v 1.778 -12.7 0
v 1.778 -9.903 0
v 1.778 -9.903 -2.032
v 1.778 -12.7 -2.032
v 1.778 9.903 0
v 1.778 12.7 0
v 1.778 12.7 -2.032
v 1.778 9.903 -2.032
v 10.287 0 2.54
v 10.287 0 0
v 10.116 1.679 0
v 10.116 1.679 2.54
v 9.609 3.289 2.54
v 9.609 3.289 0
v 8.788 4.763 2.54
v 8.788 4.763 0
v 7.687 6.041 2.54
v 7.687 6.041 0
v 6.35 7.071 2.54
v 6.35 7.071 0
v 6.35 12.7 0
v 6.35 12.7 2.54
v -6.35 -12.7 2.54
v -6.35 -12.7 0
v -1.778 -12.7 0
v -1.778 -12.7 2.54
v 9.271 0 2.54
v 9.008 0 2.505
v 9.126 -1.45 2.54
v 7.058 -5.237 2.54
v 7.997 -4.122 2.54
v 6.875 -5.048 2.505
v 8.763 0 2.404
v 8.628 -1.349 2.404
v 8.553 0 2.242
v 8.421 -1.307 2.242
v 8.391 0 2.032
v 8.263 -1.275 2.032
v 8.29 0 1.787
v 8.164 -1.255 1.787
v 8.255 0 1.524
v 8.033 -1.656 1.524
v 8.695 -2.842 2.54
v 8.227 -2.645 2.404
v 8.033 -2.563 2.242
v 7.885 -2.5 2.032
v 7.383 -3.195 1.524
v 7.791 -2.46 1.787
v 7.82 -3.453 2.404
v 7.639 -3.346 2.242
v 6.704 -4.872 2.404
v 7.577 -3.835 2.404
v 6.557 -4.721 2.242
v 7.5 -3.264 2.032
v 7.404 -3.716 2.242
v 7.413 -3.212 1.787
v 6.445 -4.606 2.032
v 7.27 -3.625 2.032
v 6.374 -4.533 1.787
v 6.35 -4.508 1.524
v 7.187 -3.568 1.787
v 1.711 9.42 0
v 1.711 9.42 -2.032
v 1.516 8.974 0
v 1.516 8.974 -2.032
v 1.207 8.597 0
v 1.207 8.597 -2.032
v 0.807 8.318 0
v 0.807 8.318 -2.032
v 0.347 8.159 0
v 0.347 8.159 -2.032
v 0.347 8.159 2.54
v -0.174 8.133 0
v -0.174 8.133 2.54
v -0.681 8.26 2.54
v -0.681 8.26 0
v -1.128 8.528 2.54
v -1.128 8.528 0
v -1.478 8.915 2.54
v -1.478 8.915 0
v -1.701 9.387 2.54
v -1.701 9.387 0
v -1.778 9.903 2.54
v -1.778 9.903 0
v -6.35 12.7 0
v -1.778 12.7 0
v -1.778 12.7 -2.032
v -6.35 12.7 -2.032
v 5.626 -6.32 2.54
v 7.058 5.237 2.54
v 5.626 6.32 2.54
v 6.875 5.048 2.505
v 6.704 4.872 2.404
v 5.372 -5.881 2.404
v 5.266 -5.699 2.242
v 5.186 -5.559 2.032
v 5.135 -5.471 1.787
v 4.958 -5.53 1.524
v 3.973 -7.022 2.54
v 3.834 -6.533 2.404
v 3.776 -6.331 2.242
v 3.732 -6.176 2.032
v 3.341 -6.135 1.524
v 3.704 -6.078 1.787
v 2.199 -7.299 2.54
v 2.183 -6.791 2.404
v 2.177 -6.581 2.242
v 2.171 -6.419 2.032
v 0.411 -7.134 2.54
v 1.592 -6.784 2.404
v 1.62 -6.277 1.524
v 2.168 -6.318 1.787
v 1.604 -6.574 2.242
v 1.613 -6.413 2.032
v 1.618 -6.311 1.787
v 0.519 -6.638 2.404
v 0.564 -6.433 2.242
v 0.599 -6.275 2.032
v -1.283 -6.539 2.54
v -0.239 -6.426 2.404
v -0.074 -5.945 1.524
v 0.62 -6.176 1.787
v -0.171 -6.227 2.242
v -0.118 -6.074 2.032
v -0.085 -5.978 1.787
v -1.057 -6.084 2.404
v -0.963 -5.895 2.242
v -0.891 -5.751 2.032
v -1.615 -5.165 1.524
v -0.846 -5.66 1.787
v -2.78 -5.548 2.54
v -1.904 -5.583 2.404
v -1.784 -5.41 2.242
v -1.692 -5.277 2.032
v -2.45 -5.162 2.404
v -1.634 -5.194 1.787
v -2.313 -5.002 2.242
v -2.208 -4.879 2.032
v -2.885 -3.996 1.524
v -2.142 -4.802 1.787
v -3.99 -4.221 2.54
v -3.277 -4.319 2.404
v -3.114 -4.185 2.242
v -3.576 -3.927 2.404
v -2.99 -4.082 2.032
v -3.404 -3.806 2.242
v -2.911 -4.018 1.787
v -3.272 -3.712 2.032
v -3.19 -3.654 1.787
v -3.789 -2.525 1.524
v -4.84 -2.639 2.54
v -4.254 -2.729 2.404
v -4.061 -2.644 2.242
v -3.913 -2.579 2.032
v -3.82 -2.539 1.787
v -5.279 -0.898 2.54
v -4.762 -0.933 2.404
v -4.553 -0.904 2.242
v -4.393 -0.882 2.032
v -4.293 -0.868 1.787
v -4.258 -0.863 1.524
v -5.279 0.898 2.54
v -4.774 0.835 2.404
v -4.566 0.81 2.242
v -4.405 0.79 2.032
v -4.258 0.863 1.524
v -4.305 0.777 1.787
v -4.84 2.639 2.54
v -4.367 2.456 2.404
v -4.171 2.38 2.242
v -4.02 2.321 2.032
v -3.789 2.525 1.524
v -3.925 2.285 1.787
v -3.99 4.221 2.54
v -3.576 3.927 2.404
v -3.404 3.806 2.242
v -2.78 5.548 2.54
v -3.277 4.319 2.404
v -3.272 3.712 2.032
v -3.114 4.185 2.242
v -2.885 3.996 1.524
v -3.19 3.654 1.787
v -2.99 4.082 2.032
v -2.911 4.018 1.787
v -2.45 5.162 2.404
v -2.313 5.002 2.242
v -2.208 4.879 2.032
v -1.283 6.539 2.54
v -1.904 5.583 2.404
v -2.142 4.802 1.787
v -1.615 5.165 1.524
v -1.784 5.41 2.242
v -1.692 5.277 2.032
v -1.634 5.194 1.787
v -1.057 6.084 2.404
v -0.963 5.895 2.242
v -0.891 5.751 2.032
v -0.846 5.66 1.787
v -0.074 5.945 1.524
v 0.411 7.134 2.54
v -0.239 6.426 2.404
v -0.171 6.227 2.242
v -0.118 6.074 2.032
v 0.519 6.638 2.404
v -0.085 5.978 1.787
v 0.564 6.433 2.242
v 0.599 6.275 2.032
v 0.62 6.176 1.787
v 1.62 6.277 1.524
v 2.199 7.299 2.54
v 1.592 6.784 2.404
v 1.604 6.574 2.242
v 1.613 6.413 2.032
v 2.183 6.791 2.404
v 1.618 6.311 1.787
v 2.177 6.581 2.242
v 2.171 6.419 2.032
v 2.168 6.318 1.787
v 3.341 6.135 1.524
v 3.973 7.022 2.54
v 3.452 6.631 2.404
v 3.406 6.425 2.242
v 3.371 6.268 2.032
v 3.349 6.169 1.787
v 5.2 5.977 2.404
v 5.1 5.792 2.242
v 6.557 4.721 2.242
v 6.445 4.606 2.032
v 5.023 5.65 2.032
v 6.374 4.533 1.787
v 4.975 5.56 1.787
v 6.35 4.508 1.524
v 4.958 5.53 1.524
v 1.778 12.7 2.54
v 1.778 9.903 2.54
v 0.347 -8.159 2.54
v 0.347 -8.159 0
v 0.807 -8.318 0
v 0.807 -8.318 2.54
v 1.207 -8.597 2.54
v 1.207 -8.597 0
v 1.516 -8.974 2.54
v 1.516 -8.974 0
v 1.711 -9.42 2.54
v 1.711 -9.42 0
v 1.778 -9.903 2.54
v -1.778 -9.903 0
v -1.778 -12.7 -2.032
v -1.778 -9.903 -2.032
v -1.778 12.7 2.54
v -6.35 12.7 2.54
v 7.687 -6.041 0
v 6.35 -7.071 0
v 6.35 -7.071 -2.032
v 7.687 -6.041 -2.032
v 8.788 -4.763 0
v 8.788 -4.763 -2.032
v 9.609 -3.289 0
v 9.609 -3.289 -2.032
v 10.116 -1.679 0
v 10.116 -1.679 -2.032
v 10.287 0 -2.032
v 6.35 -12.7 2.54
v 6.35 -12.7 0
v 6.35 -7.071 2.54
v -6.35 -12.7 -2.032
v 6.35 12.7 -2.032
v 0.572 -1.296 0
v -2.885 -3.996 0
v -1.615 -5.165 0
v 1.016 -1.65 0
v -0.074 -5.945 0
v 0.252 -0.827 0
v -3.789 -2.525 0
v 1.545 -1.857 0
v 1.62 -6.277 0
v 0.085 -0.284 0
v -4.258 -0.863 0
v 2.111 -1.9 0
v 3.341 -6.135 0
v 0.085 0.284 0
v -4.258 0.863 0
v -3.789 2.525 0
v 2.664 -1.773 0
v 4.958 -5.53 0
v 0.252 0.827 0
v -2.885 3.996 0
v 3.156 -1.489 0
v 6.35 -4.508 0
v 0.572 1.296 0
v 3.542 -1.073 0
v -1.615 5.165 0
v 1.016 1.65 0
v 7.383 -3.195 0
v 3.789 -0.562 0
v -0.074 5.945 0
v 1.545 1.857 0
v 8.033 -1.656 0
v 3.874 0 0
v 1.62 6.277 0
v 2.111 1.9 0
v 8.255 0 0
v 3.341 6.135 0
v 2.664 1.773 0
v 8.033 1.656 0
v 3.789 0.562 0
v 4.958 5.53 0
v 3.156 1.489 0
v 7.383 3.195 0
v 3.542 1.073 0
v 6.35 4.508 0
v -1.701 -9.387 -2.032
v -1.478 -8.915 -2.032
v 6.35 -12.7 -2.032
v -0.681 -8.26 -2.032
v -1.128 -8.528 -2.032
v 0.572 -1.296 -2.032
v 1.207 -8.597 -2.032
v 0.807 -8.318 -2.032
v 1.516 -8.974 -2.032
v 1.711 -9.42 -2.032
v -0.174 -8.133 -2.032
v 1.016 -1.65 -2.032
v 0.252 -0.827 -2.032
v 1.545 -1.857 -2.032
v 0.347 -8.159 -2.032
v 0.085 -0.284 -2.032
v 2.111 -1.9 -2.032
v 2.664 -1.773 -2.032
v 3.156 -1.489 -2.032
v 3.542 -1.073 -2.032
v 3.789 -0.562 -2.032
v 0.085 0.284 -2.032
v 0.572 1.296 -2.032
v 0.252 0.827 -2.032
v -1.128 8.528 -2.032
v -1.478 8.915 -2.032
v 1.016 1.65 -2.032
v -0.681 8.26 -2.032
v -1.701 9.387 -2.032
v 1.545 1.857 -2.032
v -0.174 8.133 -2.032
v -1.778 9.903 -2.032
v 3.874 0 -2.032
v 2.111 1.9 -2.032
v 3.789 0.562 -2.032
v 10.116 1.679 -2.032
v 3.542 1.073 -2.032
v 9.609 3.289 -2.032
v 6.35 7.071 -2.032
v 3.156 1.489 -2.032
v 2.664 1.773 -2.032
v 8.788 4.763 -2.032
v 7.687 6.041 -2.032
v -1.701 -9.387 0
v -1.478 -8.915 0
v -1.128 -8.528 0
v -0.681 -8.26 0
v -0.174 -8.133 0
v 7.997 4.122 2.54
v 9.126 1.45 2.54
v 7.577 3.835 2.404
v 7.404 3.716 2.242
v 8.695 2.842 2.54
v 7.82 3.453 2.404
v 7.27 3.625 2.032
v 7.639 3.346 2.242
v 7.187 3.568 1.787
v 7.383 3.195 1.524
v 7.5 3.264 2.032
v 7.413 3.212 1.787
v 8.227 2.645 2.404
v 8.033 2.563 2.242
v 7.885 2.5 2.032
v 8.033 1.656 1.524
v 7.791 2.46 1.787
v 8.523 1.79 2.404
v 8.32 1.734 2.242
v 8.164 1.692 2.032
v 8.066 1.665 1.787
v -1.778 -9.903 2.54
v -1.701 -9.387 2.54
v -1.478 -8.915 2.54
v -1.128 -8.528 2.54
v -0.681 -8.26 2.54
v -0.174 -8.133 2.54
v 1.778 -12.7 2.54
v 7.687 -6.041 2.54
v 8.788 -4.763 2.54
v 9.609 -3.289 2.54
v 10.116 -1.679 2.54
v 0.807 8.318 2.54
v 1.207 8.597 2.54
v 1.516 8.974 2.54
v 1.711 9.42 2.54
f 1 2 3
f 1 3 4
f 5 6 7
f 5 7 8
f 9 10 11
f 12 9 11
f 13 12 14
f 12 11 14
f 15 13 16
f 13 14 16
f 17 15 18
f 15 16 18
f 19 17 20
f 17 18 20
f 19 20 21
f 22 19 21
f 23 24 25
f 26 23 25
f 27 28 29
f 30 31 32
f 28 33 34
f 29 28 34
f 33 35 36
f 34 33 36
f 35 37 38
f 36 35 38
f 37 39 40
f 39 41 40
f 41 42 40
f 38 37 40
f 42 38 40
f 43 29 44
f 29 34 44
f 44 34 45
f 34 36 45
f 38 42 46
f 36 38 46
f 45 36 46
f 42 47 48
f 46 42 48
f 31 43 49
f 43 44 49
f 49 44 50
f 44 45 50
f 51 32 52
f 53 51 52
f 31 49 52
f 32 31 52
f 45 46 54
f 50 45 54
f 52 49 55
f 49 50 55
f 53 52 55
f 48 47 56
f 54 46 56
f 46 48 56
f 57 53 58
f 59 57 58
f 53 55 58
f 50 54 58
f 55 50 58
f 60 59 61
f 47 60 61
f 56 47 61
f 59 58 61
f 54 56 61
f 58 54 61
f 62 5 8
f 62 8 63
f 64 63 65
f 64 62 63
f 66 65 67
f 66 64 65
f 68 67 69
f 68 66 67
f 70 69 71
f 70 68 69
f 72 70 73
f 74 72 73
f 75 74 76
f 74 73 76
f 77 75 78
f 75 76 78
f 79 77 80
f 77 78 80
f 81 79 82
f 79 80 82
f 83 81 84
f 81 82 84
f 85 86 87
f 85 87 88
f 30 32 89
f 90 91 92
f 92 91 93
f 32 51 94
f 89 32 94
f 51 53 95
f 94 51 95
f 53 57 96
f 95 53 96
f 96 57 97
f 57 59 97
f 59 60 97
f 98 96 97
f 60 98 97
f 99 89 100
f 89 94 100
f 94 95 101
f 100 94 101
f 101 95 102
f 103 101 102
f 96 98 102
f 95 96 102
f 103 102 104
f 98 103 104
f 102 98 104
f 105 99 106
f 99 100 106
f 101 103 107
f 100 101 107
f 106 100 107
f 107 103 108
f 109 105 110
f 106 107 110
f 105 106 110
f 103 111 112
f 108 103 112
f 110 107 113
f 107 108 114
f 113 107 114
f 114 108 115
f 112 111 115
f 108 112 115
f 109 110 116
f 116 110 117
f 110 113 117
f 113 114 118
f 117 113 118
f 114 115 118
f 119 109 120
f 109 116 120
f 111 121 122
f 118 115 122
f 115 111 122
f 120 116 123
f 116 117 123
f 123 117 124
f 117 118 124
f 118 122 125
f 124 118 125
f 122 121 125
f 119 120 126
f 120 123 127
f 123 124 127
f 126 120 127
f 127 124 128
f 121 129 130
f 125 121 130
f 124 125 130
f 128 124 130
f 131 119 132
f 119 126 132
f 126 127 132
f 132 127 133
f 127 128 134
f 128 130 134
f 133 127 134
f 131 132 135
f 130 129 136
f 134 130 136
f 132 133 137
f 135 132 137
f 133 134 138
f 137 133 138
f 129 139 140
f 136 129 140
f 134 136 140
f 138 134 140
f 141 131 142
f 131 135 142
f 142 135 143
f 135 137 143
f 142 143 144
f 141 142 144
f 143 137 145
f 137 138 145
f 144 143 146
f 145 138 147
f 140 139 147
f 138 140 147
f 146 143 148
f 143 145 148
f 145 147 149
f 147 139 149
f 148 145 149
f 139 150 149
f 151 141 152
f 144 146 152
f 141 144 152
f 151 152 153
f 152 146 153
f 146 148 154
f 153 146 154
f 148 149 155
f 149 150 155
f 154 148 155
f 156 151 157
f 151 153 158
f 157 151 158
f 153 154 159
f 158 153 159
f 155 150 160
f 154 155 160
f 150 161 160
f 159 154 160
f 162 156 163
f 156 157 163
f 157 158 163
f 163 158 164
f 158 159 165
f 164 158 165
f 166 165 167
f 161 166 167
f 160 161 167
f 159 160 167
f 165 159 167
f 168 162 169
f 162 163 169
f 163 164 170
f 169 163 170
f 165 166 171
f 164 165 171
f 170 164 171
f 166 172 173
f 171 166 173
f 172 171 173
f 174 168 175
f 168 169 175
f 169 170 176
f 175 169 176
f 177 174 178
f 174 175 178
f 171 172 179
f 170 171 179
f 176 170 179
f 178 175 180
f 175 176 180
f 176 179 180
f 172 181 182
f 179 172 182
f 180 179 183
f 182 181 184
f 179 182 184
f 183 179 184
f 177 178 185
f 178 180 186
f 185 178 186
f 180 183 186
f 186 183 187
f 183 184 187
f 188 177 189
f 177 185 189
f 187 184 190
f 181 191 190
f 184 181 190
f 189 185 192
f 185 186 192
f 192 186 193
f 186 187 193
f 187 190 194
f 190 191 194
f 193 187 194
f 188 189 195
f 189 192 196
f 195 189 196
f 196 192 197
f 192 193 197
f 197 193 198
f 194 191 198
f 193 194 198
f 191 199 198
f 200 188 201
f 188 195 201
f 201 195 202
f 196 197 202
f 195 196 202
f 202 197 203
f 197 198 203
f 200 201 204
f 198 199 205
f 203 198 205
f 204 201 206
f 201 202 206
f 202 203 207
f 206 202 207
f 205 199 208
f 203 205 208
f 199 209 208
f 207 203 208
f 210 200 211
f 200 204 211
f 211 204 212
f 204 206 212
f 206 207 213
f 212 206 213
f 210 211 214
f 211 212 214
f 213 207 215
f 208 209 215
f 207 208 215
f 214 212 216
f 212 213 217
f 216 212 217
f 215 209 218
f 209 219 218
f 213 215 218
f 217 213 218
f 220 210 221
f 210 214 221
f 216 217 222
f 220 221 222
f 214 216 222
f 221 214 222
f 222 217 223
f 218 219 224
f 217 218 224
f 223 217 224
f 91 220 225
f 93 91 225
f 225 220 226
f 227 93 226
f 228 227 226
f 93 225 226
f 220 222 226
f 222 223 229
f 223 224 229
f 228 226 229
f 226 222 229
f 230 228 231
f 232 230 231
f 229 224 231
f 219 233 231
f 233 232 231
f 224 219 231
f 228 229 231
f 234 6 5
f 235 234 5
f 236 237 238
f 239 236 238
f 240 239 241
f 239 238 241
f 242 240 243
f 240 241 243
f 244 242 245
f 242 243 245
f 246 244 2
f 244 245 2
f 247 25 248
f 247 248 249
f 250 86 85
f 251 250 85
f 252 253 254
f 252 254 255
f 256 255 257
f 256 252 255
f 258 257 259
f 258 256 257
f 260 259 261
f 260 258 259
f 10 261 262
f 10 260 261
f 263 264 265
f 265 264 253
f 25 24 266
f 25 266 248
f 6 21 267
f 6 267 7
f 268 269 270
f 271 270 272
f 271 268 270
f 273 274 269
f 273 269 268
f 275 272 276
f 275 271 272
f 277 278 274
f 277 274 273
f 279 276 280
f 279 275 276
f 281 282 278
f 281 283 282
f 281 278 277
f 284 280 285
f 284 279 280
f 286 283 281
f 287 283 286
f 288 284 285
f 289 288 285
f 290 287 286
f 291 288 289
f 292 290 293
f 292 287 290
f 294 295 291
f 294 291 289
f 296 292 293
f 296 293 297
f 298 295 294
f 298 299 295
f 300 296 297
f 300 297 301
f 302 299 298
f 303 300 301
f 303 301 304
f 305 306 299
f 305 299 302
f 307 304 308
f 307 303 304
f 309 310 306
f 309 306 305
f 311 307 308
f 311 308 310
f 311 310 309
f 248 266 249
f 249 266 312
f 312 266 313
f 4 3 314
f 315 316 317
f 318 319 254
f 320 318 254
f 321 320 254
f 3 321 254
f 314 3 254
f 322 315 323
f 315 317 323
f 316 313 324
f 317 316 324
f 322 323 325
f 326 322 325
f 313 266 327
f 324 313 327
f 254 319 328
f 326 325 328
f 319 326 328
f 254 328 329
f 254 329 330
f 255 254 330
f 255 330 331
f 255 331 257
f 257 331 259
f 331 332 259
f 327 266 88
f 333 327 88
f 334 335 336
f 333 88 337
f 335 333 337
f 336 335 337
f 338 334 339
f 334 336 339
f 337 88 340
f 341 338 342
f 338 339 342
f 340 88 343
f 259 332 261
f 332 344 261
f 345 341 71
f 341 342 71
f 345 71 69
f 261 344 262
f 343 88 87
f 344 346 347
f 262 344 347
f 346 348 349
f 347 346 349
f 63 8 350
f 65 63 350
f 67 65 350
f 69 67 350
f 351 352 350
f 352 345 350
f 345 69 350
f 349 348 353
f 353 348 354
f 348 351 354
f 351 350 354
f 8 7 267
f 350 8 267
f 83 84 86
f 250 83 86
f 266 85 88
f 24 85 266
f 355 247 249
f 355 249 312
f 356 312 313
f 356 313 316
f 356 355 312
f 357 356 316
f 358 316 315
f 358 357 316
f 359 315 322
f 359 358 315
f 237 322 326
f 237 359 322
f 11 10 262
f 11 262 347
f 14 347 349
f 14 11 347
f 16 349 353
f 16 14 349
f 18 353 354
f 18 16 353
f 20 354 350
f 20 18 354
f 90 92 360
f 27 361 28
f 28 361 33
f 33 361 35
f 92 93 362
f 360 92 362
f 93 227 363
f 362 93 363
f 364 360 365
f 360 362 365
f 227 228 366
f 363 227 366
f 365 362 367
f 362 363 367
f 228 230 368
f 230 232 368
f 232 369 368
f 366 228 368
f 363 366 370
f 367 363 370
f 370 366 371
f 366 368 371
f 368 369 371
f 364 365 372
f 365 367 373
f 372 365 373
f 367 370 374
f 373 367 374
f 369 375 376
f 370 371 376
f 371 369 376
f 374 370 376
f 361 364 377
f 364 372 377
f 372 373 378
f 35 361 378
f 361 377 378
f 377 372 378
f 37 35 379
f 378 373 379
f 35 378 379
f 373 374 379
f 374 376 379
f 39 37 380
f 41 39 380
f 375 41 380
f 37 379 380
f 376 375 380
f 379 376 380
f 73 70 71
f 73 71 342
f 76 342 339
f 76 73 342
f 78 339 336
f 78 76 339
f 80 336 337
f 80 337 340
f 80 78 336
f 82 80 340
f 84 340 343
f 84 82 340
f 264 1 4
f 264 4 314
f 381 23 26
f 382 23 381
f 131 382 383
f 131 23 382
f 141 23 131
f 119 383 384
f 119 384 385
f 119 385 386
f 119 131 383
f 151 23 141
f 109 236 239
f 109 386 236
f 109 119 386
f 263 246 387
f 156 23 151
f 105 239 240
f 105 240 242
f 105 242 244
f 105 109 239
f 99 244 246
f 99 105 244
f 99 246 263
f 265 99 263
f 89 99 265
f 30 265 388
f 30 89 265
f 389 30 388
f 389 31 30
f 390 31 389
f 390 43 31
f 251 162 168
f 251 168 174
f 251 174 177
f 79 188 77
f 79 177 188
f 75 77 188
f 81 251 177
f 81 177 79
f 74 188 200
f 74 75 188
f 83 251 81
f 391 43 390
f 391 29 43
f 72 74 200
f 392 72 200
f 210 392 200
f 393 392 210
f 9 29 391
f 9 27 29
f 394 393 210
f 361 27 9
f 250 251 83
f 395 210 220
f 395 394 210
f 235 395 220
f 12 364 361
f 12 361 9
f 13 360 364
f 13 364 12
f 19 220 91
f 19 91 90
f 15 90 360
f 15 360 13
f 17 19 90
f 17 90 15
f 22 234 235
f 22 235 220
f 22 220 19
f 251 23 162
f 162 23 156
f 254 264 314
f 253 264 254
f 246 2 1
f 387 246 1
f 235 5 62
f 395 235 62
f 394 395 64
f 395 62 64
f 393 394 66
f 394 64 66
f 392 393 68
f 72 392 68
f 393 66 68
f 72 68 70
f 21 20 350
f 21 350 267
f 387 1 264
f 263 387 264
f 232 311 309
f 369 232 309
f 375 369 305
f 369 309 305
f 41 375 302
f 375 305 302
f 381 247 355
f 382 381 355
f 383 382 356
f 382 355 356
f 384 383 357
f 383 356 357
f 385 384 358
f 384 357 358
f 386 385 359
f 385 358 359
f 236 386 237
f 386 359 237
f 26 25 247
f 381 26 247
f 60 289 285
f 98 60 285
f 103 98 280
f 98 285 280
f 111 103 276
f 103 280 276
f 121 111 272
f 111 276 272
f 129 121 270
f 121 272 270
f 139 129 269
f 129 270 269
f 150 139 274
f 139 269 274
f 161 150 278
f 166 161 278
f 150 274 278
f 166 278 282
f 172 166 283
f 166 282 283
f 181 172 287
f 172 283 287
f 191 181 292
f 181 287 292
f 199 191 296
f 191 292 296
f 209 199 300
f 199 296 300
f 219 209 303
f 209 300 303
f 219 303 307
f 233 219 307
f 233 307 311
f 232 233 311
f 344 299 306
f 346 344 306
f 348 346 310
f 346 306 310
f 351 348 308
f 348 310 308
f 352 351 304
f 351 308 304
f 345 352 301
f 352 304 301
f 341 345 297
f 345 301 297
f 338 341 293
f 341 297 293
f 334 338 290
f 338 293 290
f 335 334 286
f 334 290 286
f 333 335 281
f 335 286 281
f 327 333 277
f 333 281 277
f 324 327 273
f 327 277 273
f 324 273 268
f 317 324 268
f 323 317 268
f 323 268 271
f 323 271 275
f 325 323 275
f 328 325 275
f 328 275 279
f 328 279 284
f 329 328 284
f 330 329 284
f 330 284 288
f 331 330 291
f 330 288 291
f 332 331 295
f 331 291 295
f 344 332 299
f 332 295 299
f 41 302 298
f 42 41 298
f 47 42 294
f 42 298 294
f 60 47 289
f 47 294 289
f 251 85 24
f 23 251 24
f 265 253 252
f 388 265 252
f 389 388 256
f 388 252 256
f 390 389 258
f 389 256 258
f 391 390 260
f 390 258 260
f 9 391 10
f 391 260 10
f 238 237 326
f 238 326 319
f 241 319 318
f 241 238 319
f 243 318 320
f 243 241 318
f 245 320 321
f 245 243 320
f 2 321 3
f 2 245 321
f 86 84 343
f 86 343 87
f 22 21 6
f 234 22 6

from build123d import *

# Parameters (mm, degrees)
F0_R     = 1.905
F1_DEPTH = 2.032
F2_DEPTH = 2.54
F3_R     = 1.016


with BuildPart() as f1:
    # F0 (on Top) → F1 (new body)
    with BuildSketch(Plane.XY):
        with BuildLine():
            Line((6.35, 4.5080527947), (6.35, 7.0710607408))
            ThreePointArc((6.35, 7.0710607408), (3.4516559454, 8.1852117072), (0.3466541063, 8.1588637779))
            ThreePointArc((0.3466541063, 8.1588637779), (-4.4614598428, 5.2775997073), (-6.35, 1.93e-08))
            ThreePointArc((-6.35, 1.93e-08), (-4.4614598575, -5.2775996893), (0.3466540985, -8.1588637764))
            ThreePointArc((0.3466540985, -8.1588637764), (3.4516559415, -8.1852117079), (6.35, -7.0710607408))
            Line((6.35, -7.0710607408), (6.35, -4.5080527947))
            ThreePointArc((6.35, -4.5080527947), (-4.318, 0), (6.35, 4.5080527947))
        make_face()
        with BuildLine():
            Line((6.35, -4.5080527947), (6.35, 4.5080527947))
            ThreePointArc((6.35, 4.5080527947), (-4.318, 0), (6.35, -4.5080527947))
        make_face()
        with Locations((1.9685, 0)):
            Circle(F0_R, mode=Mode.SUBTRACT)
        with BuildLine():
            ThreePointArc((8.255, 0), (7.7591986625, 2.4470168062), (6.35, 4.5080527947))
            Line((6.35, 4.5080527947), (6.35, -4.5080527947))
            ThreePointArc((6.35, -4.5080527947), (7.7591986625, -2.4470168062), (8.255, 0))
        make_face()
        with BuildLine():
            ThreePointArc((10.287, 0), (9.2364071953, 4.0465994675), (6.35, 7.0710607408))
            Line((6.35, 7.0710607408), (6.35, 4.5080527947))
            ThreePointArc((6.35, 4.5080527947), (7.7591986625, 2.4470168062), (8.255, 0))
            ThreePointArc((8.255, 0), (7.7591986625, -2.4470168062), (6.35, -4.5080527947))
            Line((6.35, -4.5080527947), (6.35, -7.0710607408))
            ThreePointArc((6.35, -7.0710607408), (9.2364071953, -4.0465994675), (10.287, 0))
        make_face()
        with BuildLine():
            Line((-1.778, 9.9027430543), (-1.778, 12.7))
            Line((-1.778, 12.7), (-6.35, 12.7))
            Line((-6.35, 12.7), (-6.35, 1.93e-08))
            ThreePointArc((-6.35, 1.93e-08), (-4.4614598428, 5.2775997073), (0.3466541063, 8.1588637779))
            ThreePointArc((0.3466541063, 8.1588637779), (-1.1280365683, 8.528400484), (-1.778, 9.9027430543))
        make_face()
        with BuildLine():
            Line((6.35, 7.0710607408), (6.35, 12.7))
            Line((6.35, 12.7), (1.778, 12.7))
            Line((1.778, 12.7), (1.778, 9.9027430543))
            ThreePointArc((1.778, 9.9027430543), (1.3743425703, 8.774706486), (0.3466541063, 8.1588637779))
            ThreePointArc((0.3466541063, 8.1588637779), (3.4516559454, 8.1852117072), (6.35, 7.0710607408))
        make_face()
        with BuildLine():
            Line((6.35, -12.7), (6.35, -7.0710607408))
            ThreePointArc((6.35, -7.0710607408), (3.4516559415, -8.1852117079), (0.3466540985, -8.1588637764))
            ThreePointArc((0.3466540985, -8.1588637764), (1.3743425678, -8.7747064829), (1.778, -9.9027430543))
            Line((1.778, -9.9027430543), (1.778, -12.7))
            Line((1.778, -12.7), (6.35, -12.7))
        make_face()
        with BuildLine():
            ThreePointArc((0.3466540985, -8.1588637764), (-4.4614598575, -5.2775996893), (-6.35, 1.93e-08))
            Line((-6.35, 1.93e-08), (-6.35, -12.7))
            Line((-6.35, -12.7), (-1.778, -12.7))
            Line((-1.778, -12.7), (-1.778, -9.9027430543))
            ThreePointArc((-1.778, -9.9027430543), (-1.1280365714, -8.5284004866), (0.3466540985, -8.1588637764))
        make_face()
    extrude(amount=-F1_DEPTH)

    # F0 (on Top) → F2 (join)
    with BuildSketch(Plane.XY):
        with BuildLine():
            Line((6.35, 4.5080527947), (6.35, 7.0710607408))
            ThreePointArc((6.35, 7.0710607408), (3.4516559454, 8.1852117072), (0.3466541063, 8.1588637779))
            ThreePointArc((0.3466541063, 8.1588637779), (-4.4614598428, 5.2775997073), (-6.35, 1.93e-08))
            ThreePointArc((-6.35, 1.93e-08), (-4.4614598575, -5.2775996893), (0.3466540985, -8.1588637764))
            ThreePointArc((0.3466540985, -8.1588637764), (3.4516559415, -8.1852117079), (6.35, -7.0710607408))
            Line((6.35, -7.0710607408), (6.35, -4.5080527947))
            ThreePointArc((6.35, -4.5080527947), (-4.318, 0), (6.35, 4.5080527947))
        make_face()
        with BuildLine():
            ThreePointArc((10.287, 0), (9.2364071953, 4.0465994675), (6.35, 7.0710607408))
            Line((6.35, 7.0710607408), (6.35, 4.5080527947))
            ThreePointArc((6.35, 4.5080527947), (7.7591986625, 2.4470168062), (8.255, 0))
            ThreePointArc((8.255, 0), (7.7591986625, -2.4470168062), (6.35, -4.5080527947))
            Line((6.35, -4.5080527947), (6.35, -7.0710607408))
            ThreePointArc((6.35, -7.0710607408), (9.2364071953, -4.0465994675), (10.287, 0))
        make_face()
        with BuildLine():
            Line((6.35, 7.0710607408), (6.35, 12.7))
            Line((6.35, 12.7), (1.778, 12.7))
            Line((1.778, 12.7), (1.778, 9.9027430543))
            ThreePointArc((1.778, 9.9027430543), (1.3743425703, 8.774706486), (0.3466541063, 8.1588637779))
            ThreePointArc((0.3466541063, 8.1588637779), (3.4516559454, 8.1852117072), (6.35, 7.0710607408))
        make_face()
        with BuildLine():
            Line((-1.778, 9.9027430543), (-1.778, 12.7))
            Line((-1.778, 12.7), (-6.35, 12.7))
            Line((-6.35, 12.7), (-6.35, 1.93e-08))
            ThreePointArc((-6.35, 1.93e-08), (-4.4614598428, 5.2775997073), (0.3466541063, 8.1588637779))
            ThreePointArc((0.3466541063, 8.1588637779), (-1.1280365683, 8.528400484), (-1.778, 9.9027430543))
        make_face()
        with BuildLine():
            Line((6.35, -12.7), (6.35, -7.0710607408))
            ThreePointArc((6.35, -7.0710607408), (3.4516559415, -8.1852117079), (0.3466540985, -8.1588637764))
            ThreePointArc((0.3466540985, -8.1588637764), (1.3743425678, -8.7747064829), (1.778, -9.9027430543))
            Line((1.778, -9.9027430543), (1.778, -12.7))
            Line((1.778, -12.7), (6.35, -12.7))
        make_face()
        with BuildLine():
            ThreePointArc((0.3466540985, -8.1588637764), (-4.4614598575, -5.2775996893), (-6.35, 1.93e-08))
            Line((-6.35, 1.93e-08), (-6.35, -12.7))
            Line((-6.35, -12.7), (-1.778, -12.7))
            Line((-1.778, -12.7), (-1.778, -9.9027430543))
            ThreePointArc((-1.778, -9.9027430543), (-1.1280365714, -8.5284004866), (0.3466540985, -8.1588637764))
        make_face()
    extrude(amount=F2_DEPTH)

    # F3
    f3_edges = [f1.edges().sort_by_distance(p)[0] for p in [
        (-2.413, -4.508053, 2.54),
    ]]
    fillet(f3_edges, radius=F3_R)


solid = f1.part
